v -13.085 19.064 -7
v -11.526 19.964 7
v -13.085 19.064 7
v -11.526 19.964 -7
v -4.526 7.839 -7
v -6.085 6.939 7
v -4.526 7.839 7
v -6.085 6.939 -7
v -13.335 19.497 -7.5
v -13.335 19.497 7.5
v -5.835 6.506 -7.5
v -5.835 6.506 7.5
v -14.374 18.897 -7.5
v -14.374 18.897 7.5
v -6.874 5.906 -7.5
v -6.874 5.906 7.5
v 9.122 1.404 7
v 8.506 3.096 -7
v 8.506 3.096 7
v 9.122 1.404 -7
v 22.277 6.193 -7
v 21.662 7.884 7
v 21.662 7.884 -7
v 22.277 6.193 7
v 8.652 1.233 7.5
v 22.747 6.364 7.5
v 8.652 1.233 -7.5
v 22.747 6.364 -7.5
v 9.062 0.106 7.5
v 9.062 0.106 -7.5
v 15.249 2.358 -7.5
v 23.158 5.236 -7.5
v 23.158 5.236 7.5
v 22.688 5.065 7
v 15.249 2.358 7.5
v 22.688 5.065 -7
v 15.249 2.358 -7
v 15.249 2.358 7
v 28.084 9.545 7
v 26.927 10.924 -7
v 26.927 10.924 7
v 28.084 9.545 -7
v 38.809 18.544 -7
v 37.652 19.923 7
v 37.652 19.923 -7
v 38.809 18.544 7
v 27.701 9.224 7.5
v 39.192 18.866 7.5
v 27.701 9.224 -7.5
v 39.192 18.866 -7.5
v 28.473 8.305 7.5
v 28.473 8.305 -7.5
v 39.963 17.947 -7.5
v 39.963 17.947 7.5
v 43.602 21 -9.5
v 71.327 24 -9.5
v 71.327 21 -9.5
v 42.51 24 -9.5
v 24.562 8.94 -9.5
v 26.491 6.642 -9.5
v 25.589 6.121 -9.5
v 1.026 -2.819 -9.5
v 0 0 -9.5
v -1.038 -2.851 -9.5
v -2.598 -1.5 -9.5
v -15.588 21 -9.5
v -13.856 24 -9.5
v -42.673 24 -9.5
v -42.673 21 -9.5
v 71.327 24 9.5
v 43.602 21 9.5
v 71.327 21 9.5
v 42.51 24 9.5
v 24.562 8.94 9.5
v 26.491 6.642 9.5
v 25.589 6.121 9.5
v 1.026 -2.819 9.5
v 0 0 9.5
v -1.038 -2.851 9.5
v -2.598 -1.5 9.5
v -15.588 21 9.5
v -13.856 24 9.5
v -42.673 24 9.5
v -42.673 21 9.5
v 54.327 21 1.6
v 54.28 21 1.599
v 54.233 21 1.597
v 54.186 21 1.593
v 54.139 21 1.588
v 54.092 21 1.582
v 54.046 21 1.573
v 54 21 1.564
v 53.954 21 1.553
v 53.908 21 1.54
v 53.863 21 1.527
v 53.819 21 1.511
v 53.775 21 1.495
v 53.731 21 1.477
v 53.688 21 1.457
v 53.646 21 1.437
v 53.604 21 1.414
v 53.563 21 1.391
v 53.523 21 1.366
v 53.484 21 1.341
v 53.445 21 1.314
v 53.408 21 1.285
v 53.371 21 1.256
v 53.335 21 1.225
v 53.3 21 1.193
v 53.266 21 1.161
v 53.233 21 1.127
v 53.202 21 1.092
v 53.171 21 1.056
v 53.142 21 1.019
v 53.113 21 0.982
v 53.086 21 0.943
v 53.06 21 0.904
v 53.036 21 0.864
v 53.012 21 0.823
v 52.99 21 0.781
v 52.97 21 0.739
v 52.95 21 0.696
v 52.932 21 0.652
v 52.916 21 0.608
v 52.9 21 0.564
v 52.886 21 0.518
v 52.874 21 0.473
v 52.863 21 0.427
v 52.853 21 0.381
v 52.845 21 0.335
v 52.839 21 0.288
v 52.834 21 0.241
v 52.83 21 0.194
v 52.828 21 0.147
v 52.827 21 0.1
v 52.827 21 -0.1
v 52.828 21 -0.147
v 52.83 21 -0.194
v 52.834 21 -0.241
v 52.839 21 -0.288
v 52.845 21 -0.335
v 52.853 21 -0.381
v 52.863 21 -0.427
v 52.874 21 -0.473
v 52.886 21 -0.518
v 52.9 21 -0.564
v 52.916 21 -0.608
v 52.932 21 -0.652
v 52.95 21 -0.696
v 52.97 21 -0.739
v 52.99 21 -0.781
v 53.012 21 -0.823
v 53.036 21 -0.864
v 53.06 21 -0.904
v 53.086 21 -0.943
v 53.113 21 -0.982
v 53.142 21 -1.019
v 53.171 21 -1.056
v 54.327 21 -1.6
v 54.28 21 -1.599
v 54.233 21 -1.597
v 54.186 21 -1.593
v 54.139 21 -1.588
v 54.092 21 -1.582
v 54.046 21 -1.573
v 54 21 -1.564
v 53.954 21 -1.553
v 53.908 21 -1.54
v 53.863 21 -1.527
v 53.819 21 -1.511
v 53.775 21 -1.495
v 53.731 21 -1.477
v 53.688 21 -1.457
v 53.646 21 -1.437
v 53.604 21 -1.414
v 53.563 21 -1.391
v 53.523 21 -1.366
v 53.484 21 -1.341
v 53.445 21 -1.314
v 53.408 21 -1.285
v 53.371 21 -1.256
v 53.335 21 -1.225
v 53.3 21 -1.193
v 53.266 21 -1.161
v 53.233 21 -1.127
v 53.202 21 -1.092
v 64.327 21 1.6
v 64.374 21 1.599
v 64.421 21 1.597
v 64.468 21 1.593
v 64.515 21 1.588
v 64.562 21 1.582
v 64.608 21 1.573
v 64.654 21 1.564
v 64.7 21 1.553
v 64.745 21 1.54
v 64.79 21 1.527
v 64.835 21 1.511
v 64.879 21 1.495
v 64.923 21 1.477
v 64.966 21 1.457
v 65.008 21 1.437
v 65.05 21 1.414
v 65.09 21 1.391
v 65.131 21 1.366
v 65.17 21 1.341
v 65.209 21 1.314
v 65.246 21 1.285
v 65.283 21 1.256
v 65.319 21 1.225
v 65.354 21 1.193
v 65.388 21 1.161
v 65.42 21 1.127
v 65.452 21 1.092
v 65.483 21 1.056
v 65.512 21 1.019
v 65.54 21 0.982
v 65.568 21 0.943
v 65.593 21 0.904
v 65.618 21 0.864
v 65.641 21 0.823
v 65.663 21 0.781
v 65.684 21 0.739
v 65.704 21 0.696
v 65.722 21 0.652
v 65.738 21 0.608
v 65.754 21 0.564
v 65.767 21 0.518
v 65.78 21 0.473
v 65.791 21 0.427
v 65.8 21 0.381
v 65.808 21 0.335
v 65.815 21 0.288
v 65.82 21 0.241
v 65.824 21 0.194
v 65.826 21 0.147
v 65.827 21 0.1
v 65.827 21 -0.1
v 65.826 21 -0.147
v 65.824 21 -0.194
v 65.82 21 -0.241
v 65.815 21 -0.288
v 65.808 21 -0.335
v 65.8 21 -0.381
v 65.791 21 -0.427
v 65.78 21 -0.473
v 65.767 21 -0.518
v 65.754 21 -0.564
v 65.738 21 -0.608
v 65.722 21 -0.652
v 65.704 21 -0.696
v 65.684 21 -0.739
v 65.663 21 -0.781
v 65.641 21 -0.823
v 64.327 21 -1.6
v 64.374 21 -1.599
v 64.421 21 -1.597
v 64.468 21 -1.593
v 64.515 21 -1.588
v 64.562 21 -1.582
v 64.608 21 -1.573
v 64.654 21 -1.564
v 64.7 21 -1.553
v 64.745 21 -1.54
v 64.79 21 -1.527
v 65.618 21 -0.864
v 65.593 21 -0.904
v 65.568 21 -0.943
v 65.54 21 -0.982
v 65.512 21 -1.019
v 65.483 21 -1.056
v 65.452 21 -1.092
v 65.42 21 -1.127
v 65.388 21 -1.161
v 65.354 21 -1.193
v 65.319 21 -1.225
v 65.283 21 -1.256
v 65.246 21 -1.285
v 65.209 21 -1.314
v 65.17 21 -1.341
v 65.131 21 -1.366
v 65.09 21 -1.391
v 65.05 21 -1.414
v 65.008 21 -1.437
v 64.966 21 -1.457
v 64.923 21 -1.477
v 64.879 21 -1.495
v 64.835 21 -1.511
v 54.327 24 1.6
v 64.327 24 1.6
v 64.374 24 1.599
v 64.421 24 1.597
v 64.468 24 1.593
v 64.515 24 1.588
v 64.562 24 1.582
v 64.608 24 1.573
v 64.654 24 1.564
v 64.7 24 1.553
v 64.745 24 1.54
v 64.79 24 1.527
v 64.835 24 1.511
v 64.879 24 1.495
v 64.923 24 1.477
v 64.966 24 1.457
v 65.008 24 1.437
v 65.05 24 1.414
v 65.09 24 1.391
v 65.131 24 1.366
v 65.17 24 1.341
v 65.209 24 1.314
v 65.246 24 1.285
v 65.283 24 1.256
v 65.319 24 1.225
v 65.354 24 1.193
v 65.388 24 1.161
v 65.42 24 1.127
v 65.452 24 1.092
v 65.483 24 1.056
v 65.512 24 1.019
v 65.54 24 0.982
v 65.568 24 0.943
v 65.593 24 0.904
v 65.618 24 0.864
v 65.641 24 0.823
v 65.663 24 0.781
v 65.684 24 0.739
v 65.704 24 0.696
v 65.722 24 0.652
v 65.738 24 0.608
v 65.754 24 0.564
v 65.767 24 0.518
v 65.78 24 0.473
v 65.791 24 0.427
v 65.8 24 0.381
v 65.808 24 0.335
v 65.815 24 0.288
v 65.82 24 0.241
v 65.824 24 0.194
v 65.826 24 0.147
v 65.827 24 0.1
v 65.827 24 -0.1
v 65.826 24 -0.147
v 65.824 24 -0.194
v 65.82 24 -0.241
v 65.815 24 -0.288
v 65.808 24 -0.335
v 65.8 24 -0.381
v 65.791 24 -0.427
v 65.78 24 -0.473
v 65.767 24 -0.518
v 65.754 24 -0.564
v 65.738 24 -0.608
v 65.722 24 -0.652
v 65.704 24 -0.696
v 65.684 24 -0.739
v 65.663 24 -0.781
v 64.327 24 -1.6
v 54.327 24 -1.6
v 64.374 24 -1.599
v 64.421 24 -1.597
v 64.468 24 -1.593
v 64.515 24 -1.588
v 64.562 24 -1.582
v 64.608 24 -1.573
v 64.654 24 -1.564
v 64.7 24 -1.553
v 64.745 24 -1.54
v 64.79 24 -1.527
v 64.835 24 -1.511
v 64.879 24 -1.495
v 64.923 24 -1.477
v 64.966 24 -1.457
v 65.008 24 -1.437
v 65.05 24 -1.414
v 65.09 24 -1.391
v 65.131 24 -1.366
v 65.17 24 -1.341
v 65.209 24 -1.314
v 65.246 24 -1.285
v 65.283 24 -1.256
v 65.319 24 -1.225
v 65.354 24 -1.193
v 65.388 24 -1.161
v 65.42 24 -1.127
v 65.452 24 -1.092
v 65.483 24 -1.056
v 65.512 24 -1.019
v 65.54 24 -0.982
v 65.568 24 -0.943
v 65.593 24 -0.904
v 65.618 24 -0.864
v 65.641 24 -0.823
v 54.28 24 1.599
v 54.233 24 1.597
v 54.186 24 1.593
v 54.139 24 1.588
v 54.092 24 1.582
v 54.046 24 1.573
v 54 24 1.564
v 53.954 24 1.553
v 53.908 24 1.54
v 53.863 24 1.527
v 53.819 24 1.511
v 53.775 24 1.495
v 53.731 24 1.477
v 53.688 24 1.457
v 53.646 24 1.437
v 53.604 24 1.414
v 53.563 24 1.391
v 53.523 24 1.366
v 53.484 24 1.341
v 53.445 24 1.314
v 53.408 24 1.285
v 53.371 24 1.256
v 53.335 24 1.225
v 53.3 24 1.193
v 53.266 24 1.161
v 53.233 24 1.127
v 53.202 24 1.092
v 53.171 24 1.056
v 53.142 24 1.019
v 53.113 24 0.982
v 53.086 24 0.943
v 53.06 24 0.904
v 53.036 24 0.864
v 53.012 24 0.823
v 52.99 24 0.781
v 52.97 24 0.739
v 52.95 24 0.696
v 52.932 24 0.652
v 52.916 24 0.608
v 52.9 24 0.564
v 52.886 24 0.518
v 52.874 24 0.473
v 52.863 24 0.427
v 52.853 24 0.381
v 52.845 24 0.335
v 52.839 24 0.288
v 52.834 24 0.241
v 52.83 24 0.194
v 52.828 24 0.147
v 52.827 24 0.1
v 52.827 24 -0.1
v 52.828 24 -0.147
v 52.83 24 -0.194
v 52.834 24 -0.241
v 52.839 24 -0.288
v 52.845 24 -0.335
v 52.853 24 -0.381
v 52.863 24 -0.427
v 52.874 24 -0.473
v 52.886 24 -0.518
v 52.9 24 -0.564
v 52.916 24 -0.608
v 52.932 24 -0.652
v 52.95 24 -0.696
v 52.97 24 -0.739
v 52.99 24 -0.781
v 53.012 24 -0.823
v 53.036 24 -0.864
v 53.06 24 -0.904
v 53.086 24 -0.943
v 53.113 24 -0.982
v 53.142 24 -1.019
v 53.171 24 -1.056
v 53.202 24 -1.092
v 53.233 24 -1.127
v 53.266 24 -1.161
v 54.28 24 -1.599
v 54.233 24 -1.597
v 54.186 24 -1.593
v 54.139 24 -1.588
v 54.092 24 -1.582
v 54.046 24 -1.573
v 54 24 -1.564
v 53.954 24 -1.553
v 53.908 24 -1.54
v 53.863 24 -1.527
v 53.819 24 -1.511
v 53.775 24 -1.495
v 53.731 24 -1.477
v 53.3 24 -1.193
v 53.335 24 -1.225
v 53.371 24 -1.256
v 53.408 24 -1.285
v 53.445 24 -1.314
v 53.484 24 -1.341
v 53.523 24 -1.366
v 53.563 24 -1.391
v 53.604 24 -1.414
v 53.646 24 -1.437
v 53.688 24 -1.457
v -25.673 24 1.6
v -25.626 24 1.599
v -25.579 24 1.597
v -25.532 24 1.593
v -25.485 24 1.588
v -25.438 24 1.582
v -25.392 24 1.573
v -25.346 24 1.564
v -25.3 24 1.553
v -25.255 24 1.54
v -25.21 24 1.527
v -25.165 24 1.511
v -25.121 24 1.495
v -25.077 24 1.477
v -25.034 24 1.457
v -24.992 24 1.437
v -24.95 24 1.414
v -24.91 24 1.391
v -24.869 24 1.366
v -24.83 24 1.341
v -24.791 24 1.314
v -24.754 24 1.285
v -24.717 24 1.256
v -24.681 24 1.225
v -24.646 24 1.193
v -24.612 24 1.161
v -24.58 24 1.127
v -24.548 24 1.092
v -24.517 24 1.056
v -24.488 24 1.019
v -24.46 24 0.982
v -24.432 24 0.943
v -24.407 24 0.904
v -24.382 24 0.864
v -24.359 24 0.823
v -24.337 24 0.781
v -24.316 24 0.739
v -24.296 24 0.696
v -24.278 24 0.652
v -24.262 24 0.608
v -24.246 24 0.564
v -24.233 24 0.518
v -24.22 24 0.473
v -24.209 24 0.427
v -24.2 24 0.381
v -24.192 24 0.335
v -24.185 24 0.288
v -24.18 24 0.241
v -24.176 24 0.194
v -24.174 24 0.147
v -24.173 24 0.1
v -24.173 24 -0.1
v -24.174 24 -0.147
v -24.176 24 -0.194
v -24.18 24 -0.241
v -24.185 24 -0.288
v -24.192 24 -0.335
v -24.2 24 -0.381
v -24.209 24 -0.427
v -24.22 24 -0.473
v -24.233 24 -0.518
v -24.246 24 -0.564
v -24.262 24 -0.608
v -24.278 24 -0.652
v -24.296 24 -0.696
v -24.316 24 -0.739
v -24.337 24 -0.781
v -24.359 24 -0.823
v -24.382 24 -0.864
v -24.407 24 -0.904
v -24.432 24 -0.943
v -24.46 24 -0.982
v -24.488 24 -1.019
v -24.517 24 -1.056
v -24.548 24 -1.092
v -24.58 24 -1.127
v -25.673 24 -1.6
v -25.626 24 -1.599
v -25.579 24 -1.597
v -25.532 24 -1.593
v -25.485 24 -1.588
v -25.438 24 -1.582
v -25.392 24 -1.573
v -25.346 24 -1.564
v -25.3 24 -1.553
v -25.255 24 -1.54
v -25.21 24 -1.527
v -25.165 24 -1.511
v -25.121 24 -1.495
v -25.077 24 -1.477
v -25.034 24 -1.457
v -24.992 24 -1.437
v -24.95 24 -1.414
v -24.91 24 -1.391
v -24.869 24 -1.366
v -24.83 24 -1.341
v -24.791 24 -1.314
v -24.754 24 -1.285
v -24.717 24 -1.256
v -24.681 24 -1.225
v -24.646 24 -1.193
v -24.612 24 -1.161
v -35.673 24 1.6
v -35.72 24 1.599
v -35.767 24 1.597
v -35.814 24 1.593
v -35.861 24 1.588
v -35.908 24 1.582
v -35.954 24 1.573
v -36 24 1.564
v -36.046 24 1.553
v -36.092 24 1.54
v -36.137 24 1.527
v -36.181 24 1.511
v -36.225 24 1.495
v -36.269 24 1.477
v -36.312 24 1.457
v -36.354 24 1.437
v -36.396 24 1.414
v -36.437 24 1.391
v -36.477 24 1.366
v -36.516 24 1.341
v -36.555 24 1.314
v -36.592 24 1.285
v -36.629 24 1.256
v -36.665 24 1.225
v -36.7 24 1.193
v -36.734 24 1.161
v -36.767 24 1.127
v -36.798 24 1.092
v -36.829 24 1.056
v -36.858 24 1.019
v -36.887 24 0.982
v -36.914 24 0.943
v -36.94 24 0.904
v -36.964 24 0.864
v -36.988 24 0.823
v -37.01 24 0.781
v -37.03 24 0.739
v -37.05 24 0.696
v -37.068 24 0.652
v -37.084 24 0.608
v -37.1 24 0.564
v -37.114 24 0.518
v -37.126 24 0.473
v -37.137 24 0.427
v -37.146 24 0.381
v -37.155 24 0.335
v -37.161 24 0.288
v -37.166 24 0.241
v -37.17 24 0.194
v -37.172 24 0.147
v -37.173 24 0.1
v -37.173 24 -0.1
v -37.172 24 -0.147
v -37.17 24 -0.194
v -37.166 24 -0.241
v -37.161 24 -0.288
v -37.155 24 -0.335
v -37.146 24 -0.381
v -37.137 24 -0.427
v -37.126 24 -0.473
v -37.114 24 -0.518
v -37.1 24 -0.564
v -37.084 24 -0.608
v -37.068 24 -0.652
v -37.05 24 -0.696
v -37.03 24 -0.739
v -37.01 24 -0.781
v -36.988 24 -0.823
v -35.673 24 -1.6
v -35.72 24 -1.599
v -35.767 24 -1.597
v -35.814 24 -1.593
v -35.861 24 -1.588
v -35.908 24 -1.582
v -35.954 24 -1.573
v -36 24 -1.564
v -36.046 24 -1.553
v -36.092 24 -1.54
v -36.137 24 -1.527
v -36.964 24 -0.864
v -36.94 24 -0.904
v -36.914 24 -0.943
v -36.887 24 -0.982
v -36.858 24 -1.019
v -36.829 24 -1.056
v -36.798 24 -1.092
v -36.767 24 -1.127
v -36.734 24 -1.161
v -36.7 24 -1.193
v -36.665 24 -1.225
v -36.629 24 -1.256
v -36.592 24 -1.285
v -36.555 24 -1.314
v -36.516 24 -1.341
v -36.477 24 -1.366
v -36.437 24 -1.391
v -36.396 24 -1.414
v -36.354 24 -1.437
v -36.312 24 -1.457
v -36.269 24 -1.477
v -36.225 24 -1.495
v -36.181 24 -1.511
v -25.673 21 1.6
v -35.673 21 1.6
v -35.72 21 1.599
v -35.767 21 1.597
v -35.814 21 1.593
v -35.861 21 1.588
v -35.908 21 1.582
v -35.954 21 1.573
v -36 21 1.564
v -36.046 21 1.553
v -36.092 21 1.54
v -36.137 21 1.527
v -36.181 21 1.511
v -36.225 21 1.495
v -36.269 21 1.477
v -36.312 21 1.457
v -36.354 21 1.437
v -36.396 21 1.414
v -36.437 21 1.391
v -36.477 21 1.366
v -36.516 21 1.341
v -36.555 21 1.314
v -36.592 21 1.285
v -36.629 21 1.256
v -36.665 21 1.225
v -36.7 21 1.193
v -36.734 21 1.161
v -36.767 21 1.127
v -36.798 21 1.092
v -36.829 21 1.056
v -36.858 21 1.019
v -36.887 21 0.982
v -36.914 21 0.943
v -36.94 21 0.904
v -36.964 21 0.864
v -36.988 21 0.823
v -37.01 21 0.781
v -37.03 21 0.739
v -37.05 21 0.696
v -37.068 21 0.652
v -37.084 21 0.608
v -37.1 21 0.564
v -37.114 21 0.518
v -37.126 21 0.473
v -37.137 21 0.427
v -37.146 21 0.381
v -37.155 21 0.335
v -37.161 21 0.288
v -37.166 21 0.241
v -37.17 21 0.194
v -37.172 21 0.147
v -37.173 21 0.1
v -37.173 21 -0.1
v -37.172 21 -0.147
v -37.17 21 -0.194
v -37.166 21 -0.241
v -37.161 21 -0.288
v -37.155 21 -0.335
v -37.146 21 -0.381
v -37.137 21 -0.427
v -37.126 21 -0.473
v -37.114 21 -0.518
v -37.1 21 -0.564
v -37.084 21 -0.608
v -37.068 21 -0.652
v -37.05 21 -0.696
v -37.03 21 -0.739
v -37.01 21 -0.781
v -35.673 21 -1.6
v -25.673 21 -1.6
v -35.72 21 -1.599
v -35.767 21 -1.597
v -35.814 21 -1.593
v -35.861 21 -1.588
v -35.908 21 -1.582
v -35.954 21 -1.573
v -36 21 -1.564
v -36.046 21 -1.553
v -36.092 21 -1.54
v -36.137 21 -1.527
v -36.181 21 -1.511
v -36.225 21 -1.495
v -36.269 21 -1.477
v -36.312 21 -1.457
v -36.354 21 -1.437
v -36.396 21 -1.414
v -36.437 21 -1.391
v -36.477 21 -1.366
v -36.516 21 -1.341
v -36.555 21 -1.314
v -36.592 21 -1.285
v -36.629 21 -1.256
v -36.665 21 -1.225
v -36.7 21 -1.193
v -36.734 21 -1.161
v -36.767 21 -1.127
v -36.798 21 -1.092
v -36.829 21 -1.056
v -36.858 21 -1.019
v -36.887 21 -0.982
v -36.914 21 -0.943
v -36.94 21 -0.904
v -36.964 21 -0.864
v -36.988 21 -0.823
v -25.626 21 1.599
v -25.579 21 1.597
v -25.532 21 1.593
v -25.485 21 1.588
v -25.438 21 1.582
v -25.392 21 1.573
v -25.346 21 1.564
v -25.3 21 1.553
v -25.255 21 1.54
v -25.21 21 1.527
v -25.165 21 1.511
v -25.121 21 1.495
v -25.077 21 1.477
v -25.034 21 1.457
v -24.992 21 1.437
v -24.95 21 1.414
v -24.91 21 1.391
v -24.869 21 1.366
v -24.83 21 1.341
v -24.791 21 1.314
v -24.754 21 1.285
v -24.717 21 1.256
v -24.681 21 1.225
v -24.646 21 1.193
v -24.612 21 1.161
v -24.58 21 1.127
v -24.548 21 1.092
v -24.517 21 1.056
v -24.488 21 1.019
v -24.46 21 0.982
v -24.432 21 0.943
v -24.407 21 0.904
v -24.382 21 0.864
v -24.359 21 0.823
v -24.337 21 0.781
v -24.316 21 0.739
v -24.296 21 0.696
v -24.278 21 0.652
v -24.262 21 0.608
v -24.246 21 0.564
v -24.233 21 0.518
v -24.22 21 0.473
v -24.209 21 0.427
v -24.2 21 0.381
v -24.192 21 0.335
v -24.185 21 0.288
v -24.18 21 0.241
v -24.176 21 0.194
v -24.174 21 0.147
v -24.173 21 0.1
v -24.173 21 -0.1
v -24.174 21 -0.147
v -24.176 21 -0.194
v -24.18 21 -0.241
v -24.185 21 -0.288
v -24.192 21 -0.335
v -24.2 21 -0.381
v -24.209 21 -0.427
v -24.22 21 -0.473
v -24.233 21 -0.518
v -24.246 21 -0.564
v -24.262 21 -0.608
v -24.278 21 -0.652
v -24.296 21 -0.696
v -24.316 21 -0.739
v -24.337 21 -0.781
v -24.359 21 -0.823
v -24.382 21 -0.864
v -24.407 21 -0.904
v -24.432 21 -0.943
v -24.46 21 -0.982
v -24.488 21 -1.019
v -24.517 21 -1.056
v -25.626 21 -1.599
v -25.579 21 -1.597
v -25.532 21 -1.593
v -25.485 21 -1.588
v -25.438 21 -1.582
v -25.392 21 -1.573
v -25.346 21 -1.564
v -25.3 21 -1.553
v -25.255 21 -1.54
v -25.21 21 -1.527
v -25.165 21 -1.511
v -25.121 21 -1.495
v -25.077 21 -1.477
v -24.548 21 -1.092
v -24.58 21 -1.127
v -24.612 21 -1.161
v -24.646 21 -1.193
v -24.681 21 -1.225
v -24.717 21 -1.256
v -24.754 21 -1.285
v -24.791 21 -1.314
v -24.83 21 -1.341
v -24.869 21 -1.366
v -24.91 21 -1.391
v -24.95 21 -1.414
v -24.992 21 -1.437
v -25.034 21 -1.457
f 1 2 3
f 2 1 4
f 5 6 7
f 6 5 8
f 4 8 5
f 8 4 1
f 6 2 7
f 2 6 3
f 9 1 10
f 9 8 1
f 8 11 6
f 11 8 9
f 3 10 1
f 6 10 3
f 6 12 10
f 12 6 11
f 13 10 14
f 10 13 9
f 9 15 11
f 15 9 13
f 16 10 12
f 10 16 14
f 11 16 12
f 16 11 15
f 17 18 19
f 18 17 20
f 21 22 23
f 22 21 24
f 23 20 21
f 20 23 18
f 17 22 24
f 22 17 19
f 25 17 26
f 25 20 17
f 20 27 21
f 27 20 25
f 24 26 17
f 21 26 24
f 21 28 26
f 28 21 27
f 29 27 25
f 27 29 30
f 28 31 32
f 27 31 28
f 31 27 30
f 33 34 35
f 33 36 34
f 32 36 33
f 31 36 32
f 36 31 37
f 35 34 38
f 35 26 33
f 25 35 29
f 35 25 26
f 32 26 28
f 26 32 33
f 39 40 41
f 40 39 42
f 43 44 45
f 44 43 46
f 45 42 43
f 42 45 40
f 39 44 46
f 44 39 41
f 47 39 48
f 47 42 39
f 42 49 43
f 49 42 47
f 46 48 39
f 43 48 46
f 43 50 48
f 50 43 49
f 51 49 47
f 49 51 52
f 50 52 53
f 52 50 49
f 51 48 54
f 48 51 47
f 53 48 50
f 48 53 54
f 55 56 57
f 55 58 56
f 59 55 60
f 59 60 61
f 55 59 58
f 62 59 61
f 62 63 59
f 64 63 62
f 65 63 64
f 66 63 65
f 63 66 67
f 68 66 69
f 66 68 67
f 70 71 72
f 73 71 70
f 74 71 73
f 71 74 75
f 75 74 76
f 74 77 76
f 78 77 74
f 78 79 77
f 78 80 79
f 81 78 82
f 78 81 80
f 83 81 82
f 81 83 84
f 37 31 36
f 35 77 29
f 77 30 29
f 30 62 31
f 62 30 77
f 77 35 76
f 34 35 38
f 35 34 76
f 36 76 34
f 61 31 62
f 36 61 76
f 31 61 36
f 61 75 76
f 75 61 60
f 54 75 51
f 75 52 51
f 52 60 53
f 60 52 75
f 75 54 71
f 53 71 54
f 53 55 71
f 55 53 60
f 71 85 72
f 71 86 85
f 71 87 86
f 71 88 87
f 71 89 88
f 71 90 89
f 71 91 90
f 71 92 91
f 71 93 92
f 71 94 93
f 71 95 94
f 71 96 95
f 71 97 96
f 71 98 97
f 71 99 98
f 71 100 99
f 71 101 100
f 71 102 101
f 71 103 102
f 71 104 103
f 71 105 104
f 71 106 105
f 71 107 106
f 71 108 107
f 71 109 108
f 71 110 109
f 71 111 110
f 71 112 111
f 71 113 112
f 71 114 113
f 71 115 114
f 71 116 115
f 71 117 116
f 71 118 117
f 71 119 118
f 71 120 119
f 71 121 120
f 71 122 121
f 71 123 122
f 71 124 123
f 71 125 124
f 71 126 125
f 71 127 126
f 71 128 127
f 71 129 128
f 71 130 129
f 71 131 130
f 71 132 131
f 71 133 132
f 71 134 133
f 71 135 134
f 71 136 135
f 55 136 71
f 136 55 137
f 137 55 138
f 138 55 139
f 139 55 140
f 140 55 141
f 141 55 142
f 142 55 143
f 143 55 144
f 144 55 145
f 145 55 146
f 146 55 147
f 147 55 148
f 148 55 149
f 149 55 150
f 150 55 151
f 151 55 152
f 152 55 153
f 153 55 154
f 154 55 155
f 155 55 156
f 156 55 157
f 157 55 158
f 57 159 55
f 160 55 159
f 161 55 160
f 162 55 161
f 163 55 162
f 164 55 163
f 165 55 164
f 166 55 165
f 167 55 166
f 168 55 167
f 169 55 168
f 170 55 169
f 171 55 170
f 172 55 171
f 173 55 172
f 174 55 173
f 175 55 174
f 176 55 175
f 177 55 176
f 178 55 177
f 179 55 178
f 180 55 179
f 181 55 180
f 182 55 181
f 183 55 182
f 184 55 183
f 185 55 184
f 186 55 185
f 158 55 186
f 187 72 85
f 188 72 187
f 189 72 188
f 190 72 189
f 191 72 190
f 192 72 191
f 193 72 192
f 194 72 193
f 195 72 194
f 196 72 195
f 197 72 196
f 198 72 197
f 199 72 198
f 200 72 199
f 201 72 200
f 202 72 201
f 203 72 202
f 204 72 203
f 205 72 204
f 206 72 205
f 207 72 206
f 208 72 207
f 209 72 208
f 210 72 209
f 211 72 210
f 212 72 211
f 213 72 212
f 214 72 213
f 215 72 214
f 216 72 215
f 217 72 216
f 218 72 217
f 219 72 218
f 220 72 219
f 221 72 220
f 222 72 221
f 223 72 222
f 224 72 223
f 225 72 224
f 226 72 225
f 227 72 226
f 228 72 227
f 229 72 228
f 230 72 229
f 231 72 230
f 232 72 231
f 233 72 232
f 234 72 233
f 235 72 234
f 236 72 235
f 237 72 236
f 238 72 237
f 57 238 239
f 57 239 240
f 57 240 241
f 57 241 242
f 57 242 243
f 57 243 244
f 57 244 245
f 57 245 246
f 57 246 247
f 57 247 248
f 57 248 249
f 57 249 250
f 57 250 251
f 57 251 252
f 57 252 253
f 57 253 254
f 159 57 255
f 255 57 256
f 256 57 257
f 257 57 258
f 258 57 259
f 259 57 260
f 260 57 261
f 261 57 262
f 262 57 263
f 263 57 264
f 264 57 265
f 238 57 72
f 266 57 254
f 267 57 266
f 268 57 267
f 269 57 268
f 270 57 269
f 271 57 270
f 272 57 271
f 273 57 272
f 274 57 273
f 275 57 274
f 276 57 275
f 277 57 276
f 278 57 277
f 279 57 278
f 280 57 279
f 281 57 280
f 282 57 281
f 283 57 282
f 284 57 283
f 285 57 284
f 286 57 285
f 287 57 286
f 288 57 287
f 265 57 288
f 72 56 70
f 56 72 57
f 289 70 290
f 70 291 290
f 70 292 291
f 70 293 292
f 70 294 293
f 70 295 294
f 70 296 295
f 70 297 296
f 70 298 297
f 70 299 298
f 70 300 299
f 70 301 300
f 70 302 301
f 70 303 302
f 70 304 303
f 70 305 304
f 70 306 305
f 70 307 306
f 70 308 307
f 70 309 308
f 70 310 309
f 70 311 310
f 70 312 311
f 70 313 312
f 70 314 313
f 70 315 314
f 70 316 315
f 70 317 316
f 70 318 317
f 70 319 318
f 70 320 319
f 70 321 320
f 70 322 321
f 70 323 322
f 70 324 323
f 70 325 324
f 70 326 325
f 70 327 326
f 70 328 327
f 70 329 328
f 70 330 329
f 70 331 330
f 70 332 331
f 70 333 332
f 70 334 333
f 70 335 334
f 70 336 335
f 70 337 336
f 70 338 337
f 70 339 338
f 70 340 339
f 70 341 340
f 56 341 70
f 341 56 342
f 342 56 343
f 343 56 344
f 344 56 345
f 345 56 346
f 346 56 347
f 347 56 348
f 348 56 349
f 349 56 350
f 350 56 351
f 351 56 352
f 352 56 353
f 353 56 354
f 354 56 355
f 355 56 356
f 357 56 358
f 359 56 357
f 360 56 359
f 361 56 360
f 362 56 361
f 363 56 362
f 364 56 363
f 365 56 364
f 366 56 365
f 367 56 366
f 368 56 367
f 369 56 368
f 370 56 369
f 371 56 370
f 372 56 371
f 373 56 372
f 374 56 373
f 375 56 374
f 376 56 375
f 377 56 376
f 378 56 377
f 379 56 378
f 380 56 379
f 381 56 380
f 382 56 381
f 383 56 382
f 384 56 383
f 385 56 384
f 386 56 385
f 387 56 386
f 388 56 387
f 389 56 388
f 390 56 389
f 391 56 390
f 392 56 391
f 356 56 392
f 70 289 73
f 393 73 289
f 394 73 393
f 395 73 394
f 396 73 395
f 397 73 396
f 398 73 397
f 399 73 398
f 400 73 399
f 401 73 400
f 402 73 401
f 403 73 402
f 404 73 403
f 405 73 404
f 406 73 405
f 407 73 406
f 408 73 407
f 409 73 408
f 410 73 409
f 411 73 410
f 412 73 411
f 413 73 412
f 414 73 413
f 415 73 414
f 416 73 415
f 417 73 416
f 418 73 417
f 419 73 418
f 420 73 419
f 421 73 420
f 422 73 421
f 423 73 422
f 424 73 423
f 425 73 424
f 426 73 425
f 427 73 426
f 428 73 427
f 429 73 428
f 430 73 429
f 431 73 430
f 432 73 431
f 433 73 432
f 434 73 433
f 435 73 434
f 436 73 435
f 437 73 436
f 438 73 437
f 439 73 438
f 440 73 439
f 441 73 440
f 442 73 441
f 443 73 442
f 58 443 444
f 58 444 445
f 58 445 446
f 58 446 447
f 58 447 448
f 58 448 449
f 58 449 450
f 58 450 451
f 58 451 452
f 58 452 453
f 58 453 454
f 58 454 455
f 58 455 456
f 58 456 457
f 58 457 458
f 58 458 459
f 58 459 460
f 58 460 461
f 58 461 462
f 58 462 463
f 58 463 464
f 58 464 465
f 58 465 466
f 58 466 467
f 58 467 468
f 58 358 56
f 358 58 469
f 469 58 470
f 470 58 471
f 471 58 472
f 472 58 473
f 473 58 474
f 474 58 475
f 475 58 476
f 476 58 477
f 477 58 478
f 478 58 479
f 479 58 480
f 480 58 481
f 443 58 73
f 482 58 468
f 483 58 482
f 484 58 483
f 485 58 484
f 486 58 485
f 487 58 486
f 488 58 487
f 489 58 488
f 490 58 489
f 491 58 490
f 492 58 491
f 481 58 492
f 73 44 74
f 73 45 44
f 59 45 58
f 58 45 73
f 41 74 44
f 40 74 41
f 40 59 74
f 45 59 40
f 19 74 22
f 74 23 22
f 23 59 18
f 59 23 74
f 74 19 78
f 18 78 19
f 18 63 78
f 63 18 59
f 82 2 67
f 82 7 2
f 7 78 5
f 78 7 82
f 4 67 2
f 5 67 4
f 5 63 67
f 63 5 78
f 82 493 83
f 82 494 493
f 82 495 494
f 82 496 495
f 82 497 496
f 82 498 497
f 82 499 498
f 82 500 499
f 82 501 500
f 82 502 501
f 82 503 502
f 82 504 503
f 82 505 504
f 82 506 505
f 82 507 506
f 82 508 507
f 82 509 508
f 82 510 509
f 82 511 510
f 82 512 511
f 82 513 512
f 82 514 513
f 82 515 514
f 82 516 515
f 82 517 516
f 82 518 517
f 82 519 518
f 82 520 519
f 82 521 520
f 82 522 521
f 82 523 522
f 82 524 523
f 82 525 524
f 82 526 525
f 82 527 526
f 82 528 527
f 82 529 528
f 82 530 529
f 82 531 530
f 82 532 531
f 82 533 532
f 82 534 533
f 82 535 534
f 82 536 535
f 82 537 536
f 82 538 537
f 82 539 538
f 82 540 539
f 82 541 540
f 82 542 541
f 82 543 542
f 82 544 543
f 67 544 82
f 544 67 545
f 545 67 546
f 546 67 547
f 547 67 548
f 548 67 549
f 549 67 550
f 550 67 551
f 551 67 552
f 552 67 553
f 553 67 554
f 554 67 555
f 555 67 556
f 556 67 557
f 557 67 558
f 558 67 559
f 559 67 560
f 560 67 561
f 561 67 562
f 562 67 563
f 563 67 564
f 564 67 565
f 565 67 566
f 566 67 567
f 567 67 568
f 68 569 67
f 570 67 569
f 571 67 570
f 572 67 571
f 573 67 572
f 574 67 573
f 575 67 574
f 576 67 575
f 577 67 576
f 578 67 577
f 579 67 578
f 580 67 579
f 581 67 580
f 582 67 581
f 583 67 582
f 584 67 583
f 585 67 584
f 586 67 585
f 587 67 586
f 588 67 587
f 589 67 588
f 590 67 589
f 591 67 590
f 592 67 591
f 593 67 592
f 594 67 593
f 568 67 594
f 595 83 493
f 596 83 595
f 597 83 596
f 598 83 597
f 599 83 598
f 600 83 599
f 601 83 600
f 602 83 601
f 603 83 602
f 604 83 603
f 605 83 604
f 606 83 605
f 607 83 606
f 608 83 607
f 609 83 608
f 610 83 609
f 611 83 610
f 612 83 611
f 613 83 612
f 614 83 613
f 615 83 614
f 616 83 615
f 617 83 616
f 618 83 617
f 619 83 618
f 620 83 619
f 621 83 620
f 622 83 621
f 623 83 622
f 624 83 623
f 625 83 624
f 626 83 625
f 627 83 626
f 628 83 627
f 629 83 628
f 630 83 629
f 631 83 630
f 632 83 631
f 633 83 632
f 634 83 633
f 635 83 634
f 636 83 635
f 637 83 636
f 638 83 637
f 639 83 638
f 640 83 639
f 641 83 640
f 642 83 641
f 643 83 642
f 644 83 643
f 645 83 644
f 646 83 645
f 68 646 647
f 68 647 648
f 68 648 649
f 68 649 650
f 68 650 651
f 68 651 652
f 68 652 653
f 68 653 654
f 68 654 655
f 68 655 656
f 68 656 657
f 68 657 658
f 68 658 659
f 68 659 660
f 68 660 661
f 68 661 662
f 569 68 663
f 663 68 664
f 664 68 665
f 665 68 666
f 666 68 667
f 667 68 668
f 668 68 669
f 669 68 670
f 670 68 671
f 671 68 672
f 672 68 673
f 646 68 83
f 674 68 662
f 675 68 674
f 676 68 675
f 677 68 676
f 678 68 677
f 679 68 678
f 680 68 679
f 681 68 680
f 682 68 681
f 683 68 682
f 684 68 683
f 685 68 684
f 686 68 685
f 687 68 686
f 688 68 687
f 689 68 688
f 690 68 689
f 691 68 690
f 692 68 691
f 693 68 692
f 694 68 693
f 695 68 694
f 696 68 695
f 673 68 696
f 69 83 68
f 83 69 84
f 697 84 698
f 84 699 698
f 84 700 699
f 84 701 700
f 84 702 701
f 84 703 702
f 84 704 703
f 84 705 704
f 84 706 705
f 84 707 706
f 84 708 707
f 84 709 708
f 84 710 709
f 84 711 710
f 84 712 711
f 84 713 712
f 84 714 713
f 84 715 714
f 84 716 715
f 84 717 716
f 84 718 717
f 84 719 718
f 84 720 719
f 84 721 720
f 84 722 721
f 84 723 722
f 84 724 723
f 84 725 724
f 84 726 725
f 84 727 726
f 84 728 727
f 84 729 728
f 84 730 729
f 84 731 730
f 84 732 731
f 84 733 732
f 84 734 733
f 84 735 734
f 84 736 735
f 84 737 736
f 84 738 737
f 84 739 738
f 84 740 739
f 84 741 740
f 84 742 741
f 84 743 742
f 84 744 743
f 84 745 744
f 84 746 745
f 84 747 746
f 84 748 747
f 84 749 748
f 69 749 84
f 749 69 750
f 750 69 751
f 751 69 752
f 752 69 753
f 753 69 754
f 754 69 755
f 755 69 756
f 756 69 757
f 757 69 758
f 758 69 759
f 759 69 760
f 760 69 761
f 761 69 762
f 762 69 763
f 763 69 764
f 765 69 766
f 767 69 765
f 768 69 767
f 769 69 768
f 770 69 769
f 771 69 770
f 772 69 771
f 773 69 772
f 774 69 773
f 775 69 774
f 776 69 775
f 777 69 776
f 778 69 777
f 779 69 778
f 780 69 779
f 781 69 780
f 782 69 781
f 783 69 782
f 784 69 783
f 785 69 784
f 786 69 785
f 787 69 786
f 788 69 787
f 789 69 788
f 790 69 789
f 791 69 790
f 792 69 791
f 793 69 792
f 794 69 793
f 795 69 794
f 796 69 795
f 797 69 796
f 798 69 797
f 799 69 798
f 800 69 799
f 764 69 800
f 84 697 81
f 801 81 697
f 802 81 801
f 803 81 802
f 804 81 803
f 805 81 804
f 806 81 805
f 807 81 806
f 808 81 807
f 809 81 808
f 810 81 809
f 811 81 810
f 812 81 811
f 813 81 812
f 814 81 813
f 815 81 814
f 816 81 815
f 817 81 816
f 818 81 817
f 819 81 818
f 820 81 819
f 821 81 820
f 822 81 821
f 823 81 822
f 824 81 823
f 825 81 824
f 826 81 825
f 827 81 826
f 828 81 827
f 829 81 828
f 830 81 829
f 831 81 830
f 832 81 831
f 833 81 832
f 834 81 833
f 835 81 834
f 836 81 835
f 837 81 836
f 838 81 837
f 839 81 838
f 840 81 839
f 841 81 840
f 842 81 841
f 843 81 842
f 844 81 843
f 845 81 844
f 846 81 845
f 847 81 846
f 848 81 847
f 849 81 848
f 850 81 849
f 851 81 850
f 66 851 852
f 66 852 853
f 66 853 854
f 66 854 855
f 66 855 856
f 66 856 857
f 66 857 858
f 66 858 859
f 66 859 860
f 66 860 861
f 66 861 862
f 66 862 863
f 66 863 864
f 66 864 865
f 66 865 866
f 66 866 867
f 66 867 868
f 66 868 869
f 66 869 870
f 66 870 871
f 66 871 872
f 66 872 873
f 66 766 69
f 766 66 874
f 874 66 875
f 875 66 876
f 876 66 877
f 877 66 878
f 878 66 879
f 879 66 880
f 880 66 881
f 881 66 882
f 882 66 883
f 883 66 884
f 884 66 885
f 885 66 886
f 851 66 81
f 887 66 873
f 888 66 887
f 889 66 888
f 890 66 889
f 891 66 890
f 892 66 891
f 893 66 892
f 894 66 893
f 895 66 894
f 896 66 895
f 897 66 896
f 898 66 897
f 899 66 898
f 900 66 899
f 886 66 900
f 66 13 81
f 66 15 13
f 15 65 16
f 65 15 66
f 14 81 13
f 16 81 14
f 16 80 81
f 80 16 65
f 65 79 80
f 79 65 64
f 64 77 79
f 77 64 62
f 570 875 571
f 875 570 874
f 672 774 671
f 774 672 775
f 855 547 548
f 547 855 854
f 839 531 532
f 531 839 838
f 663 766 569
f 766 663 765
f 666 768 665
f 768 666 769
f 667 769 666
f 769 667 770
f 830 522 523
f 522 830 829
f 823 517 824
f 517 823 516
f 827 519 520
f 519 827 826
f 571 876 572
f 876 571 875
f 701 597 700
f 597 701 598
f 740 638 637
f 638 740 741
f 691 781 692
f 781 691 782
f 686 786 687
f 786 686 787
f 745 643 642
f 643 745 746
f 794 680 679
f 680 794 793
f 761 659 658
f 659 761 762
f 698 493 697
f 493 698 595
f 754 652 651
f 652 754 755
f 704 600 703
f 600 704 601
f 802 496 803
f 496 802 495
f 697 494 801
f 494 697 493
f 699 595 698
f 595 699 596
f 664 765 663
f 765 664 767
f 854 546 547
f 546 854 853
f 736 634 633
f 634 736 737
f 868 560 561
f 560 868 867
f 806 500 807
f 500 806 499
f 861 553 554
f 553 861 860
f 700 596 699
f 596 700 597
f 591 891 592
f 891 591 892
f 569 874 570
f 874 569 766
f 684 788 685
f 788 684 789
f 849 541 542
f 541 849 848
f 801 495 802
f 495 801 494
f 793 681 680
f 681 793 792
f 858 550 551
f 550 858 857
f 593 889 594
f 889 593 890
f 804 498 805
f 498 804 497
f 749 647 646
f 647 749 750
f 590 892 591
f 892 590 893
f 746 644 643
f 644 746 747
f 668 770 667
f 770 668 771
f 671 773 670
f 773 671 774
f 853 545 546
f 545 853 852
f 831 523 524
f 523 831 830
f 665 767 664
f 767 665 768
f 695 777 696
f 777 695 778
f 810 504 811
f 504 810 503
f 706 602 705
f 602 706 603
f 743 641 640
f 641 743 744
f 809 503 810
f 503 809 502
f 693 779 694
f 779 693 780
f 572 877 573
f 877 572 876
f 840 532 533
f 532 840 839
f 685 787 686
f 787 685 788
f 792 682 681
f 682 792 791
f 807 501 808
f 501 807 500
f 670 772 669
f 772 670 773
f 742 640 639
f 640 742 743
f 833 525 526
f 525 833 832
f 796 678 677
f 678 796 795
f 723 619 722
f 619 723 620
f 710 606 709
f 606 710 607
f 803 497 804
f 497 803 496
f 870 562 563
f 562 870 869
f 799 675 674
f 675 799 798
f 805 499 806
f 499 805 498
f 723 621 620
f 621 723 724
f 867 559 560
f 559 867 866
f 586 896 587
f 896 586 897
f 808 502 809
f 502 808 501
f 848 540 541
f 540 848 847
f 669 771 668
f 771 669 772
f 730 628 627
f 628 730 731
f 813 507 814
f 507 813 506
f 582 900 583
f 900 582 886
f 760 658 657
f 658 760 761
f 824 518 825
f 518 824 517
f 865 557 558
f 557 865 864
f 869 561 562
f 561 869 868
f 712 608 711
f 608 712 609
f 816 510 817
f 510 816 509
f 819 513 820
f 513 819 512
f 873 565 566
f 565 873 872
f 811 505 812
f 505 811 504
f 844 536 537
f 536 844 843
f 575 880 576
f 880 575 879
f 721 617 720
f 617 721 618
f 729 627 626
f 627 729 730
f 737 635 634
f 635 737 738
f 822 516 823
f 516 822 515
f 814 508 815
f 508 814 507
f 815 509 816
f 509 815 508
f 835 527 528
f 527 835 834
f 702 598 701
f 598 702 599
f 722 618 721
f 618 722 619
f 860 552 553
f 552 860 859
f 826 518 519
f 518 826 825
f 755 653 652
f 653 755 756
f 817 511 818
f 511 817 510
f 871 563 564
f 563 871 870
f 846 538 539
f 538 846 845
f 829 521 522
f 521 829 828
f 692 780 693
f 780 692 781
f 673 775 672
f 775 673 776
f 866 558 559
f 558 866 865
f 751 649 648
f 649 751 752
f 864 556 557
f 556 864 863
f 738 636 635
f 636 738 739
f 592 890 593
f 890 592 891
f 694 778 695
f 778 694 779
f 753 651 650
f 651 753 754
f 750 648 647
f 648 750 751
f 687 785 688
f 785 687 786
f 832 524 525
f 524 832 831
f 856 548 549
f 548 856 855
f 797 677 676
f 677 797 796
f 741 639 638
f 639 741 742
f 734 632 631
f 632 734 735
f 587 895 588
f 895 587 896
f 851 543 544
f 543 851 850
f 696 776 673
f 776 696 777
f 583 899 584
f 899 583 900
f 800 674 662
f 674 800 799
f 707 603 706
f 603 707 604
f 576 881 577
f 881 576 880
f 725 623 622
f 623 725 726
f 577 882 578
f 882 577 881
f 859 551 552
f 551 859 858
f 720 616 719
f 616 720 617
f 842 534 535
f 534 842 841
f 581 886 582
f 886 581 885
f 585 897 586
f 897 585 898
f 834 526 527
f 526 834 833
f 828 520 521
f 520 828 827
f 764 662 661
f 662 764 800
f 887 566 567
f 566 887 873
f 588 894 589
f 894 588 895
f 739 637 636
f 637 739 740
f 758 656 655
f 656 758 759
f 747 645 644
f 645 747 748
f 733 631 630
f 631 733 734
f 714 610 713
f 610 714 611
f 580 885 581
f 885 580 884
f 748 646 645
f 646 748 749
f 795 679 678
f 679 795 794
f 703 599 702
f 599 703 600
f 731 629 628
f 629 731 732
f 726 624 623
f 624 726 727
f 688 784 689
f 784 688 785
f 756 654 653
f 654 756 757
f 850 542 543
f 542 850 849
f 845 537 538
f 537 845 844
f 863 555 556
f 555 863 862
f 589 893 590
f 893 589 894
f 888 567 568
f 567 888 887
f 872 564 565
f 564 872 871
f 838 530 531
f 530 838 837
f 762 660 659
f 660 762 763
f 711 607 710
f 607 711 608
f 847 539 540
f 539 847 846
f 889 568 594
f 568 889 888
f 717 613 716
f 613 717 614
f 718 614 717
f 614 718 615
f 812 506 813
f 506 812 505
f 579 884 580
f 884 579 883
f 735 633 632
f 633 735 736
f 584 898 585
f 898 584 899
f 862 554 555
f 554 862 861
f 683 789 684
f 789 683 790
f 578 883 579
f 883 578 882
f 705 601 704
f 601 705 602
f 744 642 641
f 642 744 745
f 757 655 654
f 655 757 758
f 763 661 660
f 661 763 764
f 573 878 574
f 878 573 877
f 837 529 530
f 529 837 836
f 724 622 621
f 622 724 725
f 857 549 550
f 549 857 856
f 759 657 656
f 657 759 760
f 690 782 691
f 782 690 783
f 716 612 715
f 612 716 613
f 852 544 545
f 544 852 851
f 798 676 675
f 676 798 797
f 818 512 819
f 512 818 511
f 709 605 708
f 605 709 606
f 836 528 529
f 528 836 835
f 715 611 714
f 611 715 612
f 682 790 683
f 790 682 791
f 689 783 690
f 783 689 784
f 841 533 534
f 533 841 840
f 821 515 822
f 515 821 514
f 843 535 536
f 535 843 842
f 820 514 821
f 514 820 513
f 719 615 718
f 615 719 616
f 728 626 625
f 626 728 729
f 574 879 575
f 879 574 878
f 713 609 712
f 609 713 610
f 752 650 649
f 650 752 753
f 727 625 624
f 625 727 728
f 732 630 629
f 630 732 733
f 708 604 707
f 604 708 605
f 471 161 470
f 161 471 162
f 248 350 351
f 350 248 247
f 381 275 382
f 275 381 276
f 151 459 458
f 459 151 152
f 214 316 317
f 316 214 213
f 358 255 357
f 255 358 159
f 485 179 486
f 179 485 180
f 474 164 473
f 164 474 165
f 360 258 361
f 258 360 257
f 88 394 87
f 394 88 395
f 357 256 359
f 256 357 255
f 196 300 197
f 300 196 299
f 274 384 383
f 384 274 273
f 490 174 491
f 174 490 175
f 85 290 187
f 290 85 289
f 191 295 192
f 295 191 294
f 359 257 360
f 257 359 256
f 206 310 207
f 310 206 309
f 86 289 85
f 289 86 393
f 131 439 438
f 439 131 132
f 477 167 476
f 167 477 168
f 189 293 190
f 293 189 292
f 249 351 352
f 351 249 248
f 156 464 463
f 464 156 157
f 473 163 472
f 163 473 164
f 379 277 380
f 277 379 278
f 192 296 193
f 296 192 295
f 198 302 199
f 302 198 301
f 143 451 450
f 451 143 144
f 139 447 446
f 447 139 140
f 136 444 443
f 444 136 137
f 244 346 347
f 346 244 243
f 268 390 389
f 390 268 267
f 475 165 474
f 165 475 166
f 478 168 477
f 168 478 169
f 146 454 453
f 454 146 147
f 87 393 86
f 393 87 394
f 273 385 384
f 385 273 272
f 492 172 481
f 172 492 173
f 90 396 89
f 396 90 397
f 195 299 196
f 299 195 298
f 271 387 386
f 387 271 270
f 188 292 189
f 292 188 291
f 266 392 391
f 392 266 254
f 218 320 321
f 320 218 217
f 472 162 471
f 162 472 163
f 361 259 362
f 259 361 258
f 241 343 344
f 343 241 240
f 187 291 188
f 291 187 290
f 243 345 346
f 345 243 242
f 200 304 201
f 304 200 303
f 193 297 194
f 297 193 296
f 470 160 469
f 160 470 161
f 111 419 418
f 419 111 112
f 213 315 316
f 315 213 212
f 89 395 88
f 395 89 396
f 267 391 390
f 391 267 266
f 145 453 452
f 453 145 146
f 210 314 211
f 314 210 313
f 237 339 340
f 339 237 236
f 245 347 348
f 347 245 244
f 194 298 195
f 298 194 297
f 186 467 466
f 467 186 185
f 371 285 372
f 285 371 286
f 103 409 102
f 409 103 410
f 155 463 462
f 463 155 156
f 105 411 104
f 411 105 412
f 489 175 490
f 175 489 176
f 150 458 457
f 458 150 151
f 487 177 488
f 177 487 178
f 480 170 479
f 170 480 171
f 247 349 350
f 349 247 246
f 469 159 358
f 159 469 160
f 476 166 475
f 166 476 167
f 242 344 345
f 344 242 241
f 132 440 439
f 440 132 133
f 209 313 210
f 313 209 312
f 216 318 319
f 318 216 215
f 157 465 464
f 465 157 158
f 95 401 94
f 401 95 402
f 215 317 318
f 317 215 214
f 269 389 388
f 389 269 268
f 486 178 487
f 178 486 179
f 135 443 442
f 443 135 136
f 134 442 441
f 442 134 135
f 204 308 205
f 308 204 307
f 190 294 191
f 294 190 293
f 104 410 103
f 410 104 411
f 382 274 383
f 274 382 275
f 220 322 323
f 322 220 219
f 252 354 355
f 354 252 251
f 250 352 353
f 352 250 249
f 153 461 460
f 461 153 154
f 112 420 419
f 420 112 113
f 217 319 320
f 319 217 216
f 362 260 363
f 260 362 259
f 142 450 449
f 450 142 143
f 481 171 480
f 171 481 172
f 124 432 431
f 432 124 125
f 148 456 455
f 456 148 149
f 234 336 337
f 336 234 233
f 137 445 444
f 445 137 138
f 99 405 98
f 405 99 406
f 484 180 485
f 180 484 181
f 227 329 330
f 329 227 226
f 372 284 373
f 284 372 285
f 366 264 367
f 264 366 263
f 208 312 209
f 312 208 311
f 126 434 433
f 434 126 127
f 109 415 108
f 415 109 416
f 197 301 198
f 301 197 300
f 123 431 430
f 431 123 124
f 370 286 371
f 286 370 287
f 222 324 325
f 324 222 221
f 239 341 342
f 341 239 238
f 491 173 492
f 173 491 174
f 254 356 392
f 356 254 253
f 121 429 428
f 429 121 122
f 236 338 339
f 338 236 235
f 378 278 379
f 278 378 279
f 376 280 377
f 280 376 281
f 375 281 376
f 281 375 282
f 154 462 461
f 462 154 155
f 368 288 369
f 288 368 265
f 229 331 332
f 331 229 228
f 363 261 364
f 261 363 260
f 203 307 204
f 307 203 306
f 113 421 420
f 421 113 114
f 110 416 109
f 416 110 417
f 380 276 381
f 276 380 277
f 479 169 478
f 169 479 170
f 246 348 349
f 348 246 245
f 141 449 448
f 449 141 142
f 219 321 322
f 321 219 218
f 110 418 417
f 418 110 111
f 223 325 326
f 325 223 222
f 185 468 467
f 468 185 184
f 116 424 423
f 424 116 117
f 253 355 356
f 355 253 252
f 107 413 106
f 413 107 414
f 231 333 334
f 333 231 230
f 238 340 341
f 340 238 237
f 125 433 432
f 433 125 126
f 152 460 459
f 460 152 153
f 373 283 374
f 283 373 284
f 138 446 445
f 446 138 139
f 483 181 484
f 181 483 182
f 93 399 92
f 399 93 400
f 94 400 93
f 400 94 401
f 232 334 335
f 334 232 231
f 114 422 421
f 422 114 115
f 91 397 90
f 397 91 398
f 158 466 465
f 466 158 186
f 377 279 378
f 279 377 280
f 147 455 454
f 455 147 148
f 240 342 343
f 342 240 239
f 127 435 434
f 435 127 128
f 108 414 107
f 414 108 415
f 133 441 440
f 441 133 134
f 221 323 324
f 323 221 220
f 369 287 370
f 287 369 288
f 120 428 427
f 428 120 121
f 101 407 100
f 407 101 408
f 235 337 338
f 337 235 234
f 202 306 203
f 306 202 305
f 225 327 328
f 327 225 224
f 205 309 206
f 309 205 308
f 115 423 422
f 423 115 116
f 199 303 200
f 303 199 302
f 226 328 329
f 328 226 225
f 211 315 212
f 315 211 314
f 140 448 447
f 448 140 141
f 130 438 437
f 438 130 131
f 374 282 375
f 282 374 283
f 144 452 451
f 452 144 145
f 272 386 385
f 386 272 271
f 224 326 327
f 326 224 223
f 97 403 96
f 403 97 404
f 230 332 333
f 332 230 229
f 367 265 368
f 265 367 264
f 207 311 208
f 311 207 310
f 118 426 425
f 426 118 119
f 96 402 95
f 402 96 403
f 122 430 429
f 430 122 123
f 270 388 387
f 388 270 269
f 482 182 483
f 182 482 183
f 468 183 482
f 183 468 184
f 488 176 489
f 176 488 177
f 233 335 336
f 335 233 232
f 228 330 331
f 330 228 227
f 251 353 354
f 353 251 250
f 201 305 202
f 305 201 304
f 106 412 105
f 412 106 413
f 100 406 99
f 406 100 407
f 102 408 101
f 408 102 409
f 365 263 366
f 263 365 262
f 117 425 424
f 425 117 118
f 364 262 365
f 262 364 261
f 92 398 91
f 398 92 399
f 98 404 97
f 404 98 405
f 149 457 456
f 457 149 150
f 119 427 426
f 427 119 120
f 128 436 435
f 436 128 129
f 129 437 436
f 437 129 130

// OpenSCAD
$fn       =200;

HEIGHT    = 19;
THICK     = 3;
PLATE     = 1.8;
DIG       = THICK - PLATE;

SW_M_S    = 14; // Switch mount size is 14x14 mm
SW_M_SPC  = 15; // Switch mount size is 14x14 mm + 0.5 mm space

SS        = 17; // (Horizontal) Area occupied by the switch - compact placement, for keycaps 17.7 x 16.7
SH        = 9;  // (Vertical)   Area occupied by the switch and keycap

// P: point
// A: angle
//
//
//    PS                          P2                                      P3                                        PF
//    *-------------------------*                                            *-------------------------------------*
//                            A2 \                                         _/ A3
//                                \                                   P31_*
//    *--------------------\       * P20                    A1         _/         *--------------------------------*
//    PBS             PB2   \       \                            P13 _*         _/|  PB3                           PBF
//                         | \       \         A0                  _/         _/  |
//                         |  \  PCA  \                       ____* P1      _/ A31|
//                         |   \       * P02             ____*            _/ A13  |
//                         |A20 \       \       *   ____/   P10          *  PB13 ------------
//                         |     \       \     __*/             ____*         
//                         |      \       \_/    P01       ____/    |  PB10
//                                 \       *          ____/      A10|
//                              A02 \     P0    _____/     A01      |
//                         __________*   *   *_____________________ 
//                                        
//                                  PB02 PB00  PB01
//

WIDTH       = 114;
MOUNT_WIDTH = 90;
TOP_Y       = 24;

A20         = 30;
A02         = 90 - A20;
A01         = 20;
A10         = 90 - A01;
A13         = 40;
A31         = 90 - A13;

A0          = 180 - A02 - A01;
A1          = 180 - (A13 - A01);
A2          = 180 - A02;
A3          = 180 - A13;

D_P0        = SH / tan(A0/2);       // distance from P0 to any switch cutout
D_P1        = SH / tan(A1/2);       // distance from P1 to any switch cutout

P0_X        = 0;
P0_Y        = 0;

P02_X       = P0_X - D_P0*sin(A20);
P02_Y       = P0_Y + D_P0*cos(A20);
P20_X       = P02_X - SS*sin(A20);
P20_Y       = P02_Y + SS*cos(A20);
P2_Y        = TOP_Y;
P2_X        = P20_X - (P2_Y-P20_Y)*tan(A20);

P01_X       = P0_X + D_P0*cos(A01);
P01_Y       = P0_Y + D_P0*sin(A01);
P10_X       = P01_X + SS*cos(A01);
P10_Y       = P01_Y + SS*sin(A01);
P1_X        = P10_X + D_P1*cos(A01);
P1_Y        = P10_Y + D_P1*sin(A01);

P13_X       = P1_X + D_P1*cos(A13);
P13_Y       = P1_Y + D_P1*sin(A13);
P31_X       = P13_X + SS*cos(A13);
P31_Y       = P13_Y + SS*sin(A13);
P3_Y        = TOP_Y;
P3_X        = P31_X + (P3_Y-P31_Y)*tan(A31);
// =========================================================================
D_P2_P3     = P3_X - P2_X;
EXTRA_X     = (WIDTH - D_P2_P3) / 2;

PS_X        = P2_X - EXTRA_X;
PS_Y        = TOP_Y; 

PBS_X       = PS_X;
PBS_Y       = PS_Y - THICK; 

PB2_X       = P2_X - THICK/tan(A2/2);
PB2_Y       = PBS_Y;

PF_X        = P3_X + EXTRA_X;
PF_Y        = TOP_Y;
PBF_X       = PF_X;
PBF_Y       = PF_Y - THICK;

PB3_X       = P3_X + THICK/tan(A3/2);
PB3_Y       = PBF_Y;

TOP_X       = (PS_X + PF_X)/2;
// =========================================================================

PB02_X      = P0_X - THICK*cos(A20);
PB02_Y      = P0_Y - THICK*sin(A20);

PB01_X      = P0_X + THICK*sin(A01);
PB01_Y      = P0_Y - THICK*cos(A01);

PB00_X      = 0.66*(PB02_X + PB01_X) - P0_X;
PB00_Y      = 0.66*(PB02_Y + PB01_Y) - P0_Y;

PB10_X      = P1_X + THICK*sin(A01);
PB10_Y      = P1_Y - THICK*cos(A01);

PB13_X      = P1_X + THICK*sin(A13);
PB13_Y      = P1_Y - THICK*cos(A13);


PCA_X       = (P02_X + P20_X)/2; // center of switch A cutout
PCA_Y       = (P02_Y + P20_Y)/2; // center of switch A cutout
PCB_X       = (P01_X + P10_X)/2; // center of switch B cutout
PCB_Y       = (P01_Y + P10_Y)/2; // center of switch B cutout
PCC_X       = (P13_X + P31_X)/2; // center of switch C cutout
PCC_Y       = (P13_Y + P31_Y)/2; // center of switch C cutout


outline_points = concat(
[ [PB3_X,   PB3_Y   ] ],
[ [PBF_X,   PBF_Y   ] ],
[ [PF_X,    PF_Y    ] ],
[ [P3_X,    P3_Y    ] ],
[ [P1_X,    P1_Y    ] ],
[ [P0_X,    P0_Y    ] ],
[ [P2_X,    P2_Y    ] ],
[ [PS_X,    PS_Y    ] ],
[ [PBS_X,   PBS_Y   ] ],
[ [PB2_X,   PB2_Y   ] ],
[ [PB02_X,  PB02_Y  ] ],
[ [PB00_X,  PB00_Y  ] ],
[ [PB01_X,  PB01_Y  ] ],
[ [PB10_X,  PB10_Y  ] ],
[ [PB13_X,  PB13_Y  ] ]
);

module raw_part() {
  translate([0, 0, -HEIGHT/2])
  linear_extrude(height = HEIGHT) polygon(outline_points);
}


module switch_cutout() {
  union() {  
    rotate([90, 0, 0])
    color("red")
    cube([SW_M_S, SW_M_S, THICK*3], center=true);

    rotate([-90, 0, 0])
    color("red")
    translate([0, 0, -DIG/2 - PLATE]) 
    cube([SW_M_SPC, SW_M_SPC, DIG], center=true);
  }
}

module mounting_cutout() { 
  color("red")
  rotate([90, 0, 0])
  linear_extrude(height = THICK*2) offset(r=1.5) polygon([ [-5, -0.1], [-5, 0.1], [5, 0.1], [5, -0.1] ]);
}


module part() {
  difference() {
    raw_part();   
    
    translate([PCA_X, PCA_Y, 0]) rotate([0, 0, -A02]) switch_cutout();
    translate([PCB_X, PCB_Y, 0]) rotate([0, 0, +A01]) switch_cutout();
    translate([PCC_X, PCC_Y, 0]) rotate([0, 0, +A13]) switch_cutout();
    
    translate([TOP_X - MOUNT_WIDTH/2, TOP_Y, 0]) mounting_cutout();
    translate([TOP_X + MOUNT_WIDTH/2, TOP_Y, 0]) mounting_cutout();
  }
}

part();
